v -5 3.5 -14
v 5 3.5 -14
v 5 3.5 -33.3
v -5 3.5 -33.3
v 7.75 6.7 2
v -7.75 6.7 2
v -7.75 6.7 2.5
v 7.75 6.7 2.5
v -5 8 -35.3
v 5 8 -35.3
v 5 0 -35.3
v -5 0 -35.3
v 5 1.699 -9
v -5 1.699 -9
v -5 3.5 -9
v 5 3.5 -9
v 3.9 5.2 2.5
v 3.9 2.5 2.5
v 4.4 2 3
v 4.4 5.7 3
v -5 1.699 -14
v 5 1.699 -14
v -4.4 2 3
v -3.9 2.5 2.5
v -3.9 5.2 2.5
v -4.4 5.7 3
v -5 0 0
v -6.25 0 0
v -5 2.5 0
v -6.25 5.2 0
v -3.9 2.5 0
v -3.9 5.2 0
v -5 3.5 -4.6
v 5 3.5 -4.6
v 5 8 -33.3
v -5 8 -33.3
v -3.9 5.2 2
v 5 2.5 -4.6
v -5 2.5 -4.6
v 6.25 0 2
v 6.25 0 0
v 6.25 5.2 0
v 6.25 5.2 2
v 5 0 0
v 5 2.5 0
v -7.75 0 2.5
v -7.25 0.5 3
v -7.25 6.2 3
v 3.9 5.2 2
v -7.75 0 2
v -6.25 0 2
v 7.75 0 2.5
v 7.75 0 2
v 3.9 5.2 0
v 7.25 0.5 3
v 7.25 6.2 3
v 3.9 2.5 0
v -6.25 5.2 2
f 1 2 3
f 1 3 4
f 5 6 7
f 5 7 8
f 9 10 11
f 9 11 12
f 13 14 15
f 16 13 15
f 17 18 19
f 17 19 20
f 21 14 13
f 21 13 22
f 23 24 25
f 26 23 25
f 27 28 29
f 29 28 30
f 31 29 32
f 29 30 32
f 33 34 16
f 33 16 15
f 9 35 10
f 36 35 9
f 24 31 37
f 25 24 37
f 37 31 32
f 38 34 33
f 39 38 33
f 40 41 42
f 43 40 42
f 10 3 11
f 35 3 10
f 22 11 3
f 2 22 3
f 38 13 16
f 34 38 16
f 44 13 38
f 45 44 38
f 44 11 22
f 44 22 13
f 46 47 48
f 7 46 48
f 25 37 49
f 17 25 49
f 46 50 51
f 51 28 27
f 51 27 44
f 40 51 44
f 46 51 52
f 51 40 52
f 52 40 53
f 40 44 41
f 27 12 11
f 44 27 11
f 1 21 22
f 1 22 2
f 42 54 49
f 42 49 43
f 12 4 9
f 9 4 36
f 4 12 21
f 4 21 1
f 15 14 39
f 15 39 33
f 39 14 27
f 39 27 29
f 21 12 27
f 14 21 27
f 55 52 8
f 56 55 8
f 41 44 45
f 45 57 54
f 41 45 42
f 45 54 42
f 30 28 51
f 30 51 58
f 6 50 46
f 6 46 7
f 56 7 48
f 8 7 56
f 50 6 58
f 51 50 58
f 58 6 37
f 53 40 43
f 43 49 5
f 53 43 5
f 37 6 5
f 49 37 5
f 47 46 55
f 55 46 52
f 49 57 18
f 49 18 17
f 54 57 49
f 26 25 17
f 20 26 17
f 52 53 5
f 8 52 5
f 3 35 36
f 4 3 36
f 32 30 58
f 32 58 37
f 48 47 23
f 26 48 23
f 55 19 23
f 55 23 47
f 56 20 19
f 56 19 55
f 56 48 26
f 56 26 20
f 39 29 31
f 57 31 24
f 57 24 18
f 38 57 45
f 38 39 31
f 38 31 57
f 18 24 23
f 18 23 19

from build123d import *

# Parameters (mm, degrees)
SKETCH1_W               = 12.5
SKETCH1_H               = 5.2
BOSS_EXTRUDE1_DEPTH     = 2
SKETCH2_W               = 7.8
SKETCH2_H               = 2
CUT_EXTRUDE1_DEPTH      = 2.7
SKETCH3_W               = 10
SKETCH3_H               = 2.5
BOSS_EXTRUDE2_DEPTH     = 4.6
SKETCH4_W               = 10
SKETCH4_H               = 3.5
BOSS_EXTRUDE3_DEPTH     = 28.7
SKETCH5_W               = 10
SKETCH5_H               = 8
BOSS_EXTRUDE4_DEPTH     = 2
CUT_EXTRUDE2_DEPTH      = 37.730811317
CUT_EXTRUDE2_DEPTH_BACK = 37.730811317
SKETCH6_W               = 5
SKETCH6_H               = 2
SKETCH7_W               = 15.5
SKETCH7_H               = 6.7
SKETCH7_W_2             = 7.8
SKETCH7_H_2             = 2.7
BOSS_EXTRUDE5_DEPTH     = 1
CHAMFER1_SIZE           = 0.5


with BuildPart() as part:
    # Sketch1 → Boss-Extrude1 (new body)
    with BuildSketch(Plane.XY):
        with Locations((0, 2.6)):
            Rectangle(SKETCH1_W, SKETCH1_H)
    extrude(amount=BOSS_EXTRUDE1_DEPTH)

    # Sketch2 → Cut-Extrude1 (cut)
    with BuildSketch(Plane(origin=(0, 5.2, 0), x_dir=(1, 0, 0), z_dir=(0, 1, 0))):
        with Locations((0, -1)):
            Rectangle(SKETCH2_W, SKETCH2_H)
    extrude(amount=-CUT_EXTRUDE1_DEPTH, mode=Mode.SUBTRACT)

    # Sketch3 → Boss-Extrude2 (add)
    with BuildSketch(Plane(origin=(0, 0, 0), x_dir=(-1, 0, 0), z_dir=(0, 0, -1))):
        with Locations((0, 1.25)):
            Rectangle(SKETCH3_W, SKETCH3_H)
    extrude(amount=BOSS_EXTRUDE2_DEPTH)

    # Sketch4 → Boss-Extrude3 (add)
    with BuildSketch(Plane(origin=(0, 0, -4.6), x_dir=(-1, 0, 0), z_dir=(0, 0, -1))):
        with Locations((0, 1.75)):
            Rectangle(SKETCH4_W, SKETCH4_H)
    extrude(amount=BOSS_EXTRUDE3_DEPTH)

    # Sketch5 → Boss-Extrude4 (add)
    with BuildSketch(Plane(origin=(0, 0, -33.3), x_dir=(-1, 0, 0), z_dir=(0, 0, -1))):
        with Locations((0, 4)):
            Rectangle(SKETCH5_W, SKETCH5_H)
    extrude(amount=BOSS_EXTRUDE4_DEPTH)

    # Sketch6 → Cut-Extrude2 (cut, two sides: drawn at the far end of the back side and taken through both)
    with BuildSketch(Plane(origin=(0, 0, 0), x_dir=(0, 0, -1), z_dir=(1, 0, 0)).offset(-CUT_EXTRUDE2_DEPTH_BACK)):
        with Locations((11.5, 2.698552558)):
            Rectangle(SKETCH6_W, SKETCH6_H)
    extrude(amount=CUT_EXTRUDE2_DEPTH + CUT_EXTRUDE2_DEPTH_BACK, mode=Mode.SUBTRACT)

    # Sketch7 → Boss-Extrude5 (add)
    with BuildSketch(Plane.XY.offset(2)):
        with Locations((0, 3.35)):
            Rectangle(SKETCH7_W, SKETCH7_H)
        with Locations((0, 3.85)):
            Rectangle(SKETCH7_W_2, SKETCH7_H_2, mode=Mode.SUBTRACT)
    extrude(amount=BOSS_EXTRUDE5_DEPTH)

    # Chamfer1
    chamfer1_edges = [part.edges().sort_by_distance(p)[0] for p in [
        (0, 5.2, 3),
        (-7.75, 3.35, 3),
        (0, 0, 3),
        (7.75, 3.35, 3),
        (0, 6.7, 3),
        (-3.9, 3.85, 3),
        (0, 2.5, 3),
        (3.9, 3.85, 3),
    ]]
    chamfer(chamfer1_edges, length=CHAMFER1_SIZE)


solid = part.part
